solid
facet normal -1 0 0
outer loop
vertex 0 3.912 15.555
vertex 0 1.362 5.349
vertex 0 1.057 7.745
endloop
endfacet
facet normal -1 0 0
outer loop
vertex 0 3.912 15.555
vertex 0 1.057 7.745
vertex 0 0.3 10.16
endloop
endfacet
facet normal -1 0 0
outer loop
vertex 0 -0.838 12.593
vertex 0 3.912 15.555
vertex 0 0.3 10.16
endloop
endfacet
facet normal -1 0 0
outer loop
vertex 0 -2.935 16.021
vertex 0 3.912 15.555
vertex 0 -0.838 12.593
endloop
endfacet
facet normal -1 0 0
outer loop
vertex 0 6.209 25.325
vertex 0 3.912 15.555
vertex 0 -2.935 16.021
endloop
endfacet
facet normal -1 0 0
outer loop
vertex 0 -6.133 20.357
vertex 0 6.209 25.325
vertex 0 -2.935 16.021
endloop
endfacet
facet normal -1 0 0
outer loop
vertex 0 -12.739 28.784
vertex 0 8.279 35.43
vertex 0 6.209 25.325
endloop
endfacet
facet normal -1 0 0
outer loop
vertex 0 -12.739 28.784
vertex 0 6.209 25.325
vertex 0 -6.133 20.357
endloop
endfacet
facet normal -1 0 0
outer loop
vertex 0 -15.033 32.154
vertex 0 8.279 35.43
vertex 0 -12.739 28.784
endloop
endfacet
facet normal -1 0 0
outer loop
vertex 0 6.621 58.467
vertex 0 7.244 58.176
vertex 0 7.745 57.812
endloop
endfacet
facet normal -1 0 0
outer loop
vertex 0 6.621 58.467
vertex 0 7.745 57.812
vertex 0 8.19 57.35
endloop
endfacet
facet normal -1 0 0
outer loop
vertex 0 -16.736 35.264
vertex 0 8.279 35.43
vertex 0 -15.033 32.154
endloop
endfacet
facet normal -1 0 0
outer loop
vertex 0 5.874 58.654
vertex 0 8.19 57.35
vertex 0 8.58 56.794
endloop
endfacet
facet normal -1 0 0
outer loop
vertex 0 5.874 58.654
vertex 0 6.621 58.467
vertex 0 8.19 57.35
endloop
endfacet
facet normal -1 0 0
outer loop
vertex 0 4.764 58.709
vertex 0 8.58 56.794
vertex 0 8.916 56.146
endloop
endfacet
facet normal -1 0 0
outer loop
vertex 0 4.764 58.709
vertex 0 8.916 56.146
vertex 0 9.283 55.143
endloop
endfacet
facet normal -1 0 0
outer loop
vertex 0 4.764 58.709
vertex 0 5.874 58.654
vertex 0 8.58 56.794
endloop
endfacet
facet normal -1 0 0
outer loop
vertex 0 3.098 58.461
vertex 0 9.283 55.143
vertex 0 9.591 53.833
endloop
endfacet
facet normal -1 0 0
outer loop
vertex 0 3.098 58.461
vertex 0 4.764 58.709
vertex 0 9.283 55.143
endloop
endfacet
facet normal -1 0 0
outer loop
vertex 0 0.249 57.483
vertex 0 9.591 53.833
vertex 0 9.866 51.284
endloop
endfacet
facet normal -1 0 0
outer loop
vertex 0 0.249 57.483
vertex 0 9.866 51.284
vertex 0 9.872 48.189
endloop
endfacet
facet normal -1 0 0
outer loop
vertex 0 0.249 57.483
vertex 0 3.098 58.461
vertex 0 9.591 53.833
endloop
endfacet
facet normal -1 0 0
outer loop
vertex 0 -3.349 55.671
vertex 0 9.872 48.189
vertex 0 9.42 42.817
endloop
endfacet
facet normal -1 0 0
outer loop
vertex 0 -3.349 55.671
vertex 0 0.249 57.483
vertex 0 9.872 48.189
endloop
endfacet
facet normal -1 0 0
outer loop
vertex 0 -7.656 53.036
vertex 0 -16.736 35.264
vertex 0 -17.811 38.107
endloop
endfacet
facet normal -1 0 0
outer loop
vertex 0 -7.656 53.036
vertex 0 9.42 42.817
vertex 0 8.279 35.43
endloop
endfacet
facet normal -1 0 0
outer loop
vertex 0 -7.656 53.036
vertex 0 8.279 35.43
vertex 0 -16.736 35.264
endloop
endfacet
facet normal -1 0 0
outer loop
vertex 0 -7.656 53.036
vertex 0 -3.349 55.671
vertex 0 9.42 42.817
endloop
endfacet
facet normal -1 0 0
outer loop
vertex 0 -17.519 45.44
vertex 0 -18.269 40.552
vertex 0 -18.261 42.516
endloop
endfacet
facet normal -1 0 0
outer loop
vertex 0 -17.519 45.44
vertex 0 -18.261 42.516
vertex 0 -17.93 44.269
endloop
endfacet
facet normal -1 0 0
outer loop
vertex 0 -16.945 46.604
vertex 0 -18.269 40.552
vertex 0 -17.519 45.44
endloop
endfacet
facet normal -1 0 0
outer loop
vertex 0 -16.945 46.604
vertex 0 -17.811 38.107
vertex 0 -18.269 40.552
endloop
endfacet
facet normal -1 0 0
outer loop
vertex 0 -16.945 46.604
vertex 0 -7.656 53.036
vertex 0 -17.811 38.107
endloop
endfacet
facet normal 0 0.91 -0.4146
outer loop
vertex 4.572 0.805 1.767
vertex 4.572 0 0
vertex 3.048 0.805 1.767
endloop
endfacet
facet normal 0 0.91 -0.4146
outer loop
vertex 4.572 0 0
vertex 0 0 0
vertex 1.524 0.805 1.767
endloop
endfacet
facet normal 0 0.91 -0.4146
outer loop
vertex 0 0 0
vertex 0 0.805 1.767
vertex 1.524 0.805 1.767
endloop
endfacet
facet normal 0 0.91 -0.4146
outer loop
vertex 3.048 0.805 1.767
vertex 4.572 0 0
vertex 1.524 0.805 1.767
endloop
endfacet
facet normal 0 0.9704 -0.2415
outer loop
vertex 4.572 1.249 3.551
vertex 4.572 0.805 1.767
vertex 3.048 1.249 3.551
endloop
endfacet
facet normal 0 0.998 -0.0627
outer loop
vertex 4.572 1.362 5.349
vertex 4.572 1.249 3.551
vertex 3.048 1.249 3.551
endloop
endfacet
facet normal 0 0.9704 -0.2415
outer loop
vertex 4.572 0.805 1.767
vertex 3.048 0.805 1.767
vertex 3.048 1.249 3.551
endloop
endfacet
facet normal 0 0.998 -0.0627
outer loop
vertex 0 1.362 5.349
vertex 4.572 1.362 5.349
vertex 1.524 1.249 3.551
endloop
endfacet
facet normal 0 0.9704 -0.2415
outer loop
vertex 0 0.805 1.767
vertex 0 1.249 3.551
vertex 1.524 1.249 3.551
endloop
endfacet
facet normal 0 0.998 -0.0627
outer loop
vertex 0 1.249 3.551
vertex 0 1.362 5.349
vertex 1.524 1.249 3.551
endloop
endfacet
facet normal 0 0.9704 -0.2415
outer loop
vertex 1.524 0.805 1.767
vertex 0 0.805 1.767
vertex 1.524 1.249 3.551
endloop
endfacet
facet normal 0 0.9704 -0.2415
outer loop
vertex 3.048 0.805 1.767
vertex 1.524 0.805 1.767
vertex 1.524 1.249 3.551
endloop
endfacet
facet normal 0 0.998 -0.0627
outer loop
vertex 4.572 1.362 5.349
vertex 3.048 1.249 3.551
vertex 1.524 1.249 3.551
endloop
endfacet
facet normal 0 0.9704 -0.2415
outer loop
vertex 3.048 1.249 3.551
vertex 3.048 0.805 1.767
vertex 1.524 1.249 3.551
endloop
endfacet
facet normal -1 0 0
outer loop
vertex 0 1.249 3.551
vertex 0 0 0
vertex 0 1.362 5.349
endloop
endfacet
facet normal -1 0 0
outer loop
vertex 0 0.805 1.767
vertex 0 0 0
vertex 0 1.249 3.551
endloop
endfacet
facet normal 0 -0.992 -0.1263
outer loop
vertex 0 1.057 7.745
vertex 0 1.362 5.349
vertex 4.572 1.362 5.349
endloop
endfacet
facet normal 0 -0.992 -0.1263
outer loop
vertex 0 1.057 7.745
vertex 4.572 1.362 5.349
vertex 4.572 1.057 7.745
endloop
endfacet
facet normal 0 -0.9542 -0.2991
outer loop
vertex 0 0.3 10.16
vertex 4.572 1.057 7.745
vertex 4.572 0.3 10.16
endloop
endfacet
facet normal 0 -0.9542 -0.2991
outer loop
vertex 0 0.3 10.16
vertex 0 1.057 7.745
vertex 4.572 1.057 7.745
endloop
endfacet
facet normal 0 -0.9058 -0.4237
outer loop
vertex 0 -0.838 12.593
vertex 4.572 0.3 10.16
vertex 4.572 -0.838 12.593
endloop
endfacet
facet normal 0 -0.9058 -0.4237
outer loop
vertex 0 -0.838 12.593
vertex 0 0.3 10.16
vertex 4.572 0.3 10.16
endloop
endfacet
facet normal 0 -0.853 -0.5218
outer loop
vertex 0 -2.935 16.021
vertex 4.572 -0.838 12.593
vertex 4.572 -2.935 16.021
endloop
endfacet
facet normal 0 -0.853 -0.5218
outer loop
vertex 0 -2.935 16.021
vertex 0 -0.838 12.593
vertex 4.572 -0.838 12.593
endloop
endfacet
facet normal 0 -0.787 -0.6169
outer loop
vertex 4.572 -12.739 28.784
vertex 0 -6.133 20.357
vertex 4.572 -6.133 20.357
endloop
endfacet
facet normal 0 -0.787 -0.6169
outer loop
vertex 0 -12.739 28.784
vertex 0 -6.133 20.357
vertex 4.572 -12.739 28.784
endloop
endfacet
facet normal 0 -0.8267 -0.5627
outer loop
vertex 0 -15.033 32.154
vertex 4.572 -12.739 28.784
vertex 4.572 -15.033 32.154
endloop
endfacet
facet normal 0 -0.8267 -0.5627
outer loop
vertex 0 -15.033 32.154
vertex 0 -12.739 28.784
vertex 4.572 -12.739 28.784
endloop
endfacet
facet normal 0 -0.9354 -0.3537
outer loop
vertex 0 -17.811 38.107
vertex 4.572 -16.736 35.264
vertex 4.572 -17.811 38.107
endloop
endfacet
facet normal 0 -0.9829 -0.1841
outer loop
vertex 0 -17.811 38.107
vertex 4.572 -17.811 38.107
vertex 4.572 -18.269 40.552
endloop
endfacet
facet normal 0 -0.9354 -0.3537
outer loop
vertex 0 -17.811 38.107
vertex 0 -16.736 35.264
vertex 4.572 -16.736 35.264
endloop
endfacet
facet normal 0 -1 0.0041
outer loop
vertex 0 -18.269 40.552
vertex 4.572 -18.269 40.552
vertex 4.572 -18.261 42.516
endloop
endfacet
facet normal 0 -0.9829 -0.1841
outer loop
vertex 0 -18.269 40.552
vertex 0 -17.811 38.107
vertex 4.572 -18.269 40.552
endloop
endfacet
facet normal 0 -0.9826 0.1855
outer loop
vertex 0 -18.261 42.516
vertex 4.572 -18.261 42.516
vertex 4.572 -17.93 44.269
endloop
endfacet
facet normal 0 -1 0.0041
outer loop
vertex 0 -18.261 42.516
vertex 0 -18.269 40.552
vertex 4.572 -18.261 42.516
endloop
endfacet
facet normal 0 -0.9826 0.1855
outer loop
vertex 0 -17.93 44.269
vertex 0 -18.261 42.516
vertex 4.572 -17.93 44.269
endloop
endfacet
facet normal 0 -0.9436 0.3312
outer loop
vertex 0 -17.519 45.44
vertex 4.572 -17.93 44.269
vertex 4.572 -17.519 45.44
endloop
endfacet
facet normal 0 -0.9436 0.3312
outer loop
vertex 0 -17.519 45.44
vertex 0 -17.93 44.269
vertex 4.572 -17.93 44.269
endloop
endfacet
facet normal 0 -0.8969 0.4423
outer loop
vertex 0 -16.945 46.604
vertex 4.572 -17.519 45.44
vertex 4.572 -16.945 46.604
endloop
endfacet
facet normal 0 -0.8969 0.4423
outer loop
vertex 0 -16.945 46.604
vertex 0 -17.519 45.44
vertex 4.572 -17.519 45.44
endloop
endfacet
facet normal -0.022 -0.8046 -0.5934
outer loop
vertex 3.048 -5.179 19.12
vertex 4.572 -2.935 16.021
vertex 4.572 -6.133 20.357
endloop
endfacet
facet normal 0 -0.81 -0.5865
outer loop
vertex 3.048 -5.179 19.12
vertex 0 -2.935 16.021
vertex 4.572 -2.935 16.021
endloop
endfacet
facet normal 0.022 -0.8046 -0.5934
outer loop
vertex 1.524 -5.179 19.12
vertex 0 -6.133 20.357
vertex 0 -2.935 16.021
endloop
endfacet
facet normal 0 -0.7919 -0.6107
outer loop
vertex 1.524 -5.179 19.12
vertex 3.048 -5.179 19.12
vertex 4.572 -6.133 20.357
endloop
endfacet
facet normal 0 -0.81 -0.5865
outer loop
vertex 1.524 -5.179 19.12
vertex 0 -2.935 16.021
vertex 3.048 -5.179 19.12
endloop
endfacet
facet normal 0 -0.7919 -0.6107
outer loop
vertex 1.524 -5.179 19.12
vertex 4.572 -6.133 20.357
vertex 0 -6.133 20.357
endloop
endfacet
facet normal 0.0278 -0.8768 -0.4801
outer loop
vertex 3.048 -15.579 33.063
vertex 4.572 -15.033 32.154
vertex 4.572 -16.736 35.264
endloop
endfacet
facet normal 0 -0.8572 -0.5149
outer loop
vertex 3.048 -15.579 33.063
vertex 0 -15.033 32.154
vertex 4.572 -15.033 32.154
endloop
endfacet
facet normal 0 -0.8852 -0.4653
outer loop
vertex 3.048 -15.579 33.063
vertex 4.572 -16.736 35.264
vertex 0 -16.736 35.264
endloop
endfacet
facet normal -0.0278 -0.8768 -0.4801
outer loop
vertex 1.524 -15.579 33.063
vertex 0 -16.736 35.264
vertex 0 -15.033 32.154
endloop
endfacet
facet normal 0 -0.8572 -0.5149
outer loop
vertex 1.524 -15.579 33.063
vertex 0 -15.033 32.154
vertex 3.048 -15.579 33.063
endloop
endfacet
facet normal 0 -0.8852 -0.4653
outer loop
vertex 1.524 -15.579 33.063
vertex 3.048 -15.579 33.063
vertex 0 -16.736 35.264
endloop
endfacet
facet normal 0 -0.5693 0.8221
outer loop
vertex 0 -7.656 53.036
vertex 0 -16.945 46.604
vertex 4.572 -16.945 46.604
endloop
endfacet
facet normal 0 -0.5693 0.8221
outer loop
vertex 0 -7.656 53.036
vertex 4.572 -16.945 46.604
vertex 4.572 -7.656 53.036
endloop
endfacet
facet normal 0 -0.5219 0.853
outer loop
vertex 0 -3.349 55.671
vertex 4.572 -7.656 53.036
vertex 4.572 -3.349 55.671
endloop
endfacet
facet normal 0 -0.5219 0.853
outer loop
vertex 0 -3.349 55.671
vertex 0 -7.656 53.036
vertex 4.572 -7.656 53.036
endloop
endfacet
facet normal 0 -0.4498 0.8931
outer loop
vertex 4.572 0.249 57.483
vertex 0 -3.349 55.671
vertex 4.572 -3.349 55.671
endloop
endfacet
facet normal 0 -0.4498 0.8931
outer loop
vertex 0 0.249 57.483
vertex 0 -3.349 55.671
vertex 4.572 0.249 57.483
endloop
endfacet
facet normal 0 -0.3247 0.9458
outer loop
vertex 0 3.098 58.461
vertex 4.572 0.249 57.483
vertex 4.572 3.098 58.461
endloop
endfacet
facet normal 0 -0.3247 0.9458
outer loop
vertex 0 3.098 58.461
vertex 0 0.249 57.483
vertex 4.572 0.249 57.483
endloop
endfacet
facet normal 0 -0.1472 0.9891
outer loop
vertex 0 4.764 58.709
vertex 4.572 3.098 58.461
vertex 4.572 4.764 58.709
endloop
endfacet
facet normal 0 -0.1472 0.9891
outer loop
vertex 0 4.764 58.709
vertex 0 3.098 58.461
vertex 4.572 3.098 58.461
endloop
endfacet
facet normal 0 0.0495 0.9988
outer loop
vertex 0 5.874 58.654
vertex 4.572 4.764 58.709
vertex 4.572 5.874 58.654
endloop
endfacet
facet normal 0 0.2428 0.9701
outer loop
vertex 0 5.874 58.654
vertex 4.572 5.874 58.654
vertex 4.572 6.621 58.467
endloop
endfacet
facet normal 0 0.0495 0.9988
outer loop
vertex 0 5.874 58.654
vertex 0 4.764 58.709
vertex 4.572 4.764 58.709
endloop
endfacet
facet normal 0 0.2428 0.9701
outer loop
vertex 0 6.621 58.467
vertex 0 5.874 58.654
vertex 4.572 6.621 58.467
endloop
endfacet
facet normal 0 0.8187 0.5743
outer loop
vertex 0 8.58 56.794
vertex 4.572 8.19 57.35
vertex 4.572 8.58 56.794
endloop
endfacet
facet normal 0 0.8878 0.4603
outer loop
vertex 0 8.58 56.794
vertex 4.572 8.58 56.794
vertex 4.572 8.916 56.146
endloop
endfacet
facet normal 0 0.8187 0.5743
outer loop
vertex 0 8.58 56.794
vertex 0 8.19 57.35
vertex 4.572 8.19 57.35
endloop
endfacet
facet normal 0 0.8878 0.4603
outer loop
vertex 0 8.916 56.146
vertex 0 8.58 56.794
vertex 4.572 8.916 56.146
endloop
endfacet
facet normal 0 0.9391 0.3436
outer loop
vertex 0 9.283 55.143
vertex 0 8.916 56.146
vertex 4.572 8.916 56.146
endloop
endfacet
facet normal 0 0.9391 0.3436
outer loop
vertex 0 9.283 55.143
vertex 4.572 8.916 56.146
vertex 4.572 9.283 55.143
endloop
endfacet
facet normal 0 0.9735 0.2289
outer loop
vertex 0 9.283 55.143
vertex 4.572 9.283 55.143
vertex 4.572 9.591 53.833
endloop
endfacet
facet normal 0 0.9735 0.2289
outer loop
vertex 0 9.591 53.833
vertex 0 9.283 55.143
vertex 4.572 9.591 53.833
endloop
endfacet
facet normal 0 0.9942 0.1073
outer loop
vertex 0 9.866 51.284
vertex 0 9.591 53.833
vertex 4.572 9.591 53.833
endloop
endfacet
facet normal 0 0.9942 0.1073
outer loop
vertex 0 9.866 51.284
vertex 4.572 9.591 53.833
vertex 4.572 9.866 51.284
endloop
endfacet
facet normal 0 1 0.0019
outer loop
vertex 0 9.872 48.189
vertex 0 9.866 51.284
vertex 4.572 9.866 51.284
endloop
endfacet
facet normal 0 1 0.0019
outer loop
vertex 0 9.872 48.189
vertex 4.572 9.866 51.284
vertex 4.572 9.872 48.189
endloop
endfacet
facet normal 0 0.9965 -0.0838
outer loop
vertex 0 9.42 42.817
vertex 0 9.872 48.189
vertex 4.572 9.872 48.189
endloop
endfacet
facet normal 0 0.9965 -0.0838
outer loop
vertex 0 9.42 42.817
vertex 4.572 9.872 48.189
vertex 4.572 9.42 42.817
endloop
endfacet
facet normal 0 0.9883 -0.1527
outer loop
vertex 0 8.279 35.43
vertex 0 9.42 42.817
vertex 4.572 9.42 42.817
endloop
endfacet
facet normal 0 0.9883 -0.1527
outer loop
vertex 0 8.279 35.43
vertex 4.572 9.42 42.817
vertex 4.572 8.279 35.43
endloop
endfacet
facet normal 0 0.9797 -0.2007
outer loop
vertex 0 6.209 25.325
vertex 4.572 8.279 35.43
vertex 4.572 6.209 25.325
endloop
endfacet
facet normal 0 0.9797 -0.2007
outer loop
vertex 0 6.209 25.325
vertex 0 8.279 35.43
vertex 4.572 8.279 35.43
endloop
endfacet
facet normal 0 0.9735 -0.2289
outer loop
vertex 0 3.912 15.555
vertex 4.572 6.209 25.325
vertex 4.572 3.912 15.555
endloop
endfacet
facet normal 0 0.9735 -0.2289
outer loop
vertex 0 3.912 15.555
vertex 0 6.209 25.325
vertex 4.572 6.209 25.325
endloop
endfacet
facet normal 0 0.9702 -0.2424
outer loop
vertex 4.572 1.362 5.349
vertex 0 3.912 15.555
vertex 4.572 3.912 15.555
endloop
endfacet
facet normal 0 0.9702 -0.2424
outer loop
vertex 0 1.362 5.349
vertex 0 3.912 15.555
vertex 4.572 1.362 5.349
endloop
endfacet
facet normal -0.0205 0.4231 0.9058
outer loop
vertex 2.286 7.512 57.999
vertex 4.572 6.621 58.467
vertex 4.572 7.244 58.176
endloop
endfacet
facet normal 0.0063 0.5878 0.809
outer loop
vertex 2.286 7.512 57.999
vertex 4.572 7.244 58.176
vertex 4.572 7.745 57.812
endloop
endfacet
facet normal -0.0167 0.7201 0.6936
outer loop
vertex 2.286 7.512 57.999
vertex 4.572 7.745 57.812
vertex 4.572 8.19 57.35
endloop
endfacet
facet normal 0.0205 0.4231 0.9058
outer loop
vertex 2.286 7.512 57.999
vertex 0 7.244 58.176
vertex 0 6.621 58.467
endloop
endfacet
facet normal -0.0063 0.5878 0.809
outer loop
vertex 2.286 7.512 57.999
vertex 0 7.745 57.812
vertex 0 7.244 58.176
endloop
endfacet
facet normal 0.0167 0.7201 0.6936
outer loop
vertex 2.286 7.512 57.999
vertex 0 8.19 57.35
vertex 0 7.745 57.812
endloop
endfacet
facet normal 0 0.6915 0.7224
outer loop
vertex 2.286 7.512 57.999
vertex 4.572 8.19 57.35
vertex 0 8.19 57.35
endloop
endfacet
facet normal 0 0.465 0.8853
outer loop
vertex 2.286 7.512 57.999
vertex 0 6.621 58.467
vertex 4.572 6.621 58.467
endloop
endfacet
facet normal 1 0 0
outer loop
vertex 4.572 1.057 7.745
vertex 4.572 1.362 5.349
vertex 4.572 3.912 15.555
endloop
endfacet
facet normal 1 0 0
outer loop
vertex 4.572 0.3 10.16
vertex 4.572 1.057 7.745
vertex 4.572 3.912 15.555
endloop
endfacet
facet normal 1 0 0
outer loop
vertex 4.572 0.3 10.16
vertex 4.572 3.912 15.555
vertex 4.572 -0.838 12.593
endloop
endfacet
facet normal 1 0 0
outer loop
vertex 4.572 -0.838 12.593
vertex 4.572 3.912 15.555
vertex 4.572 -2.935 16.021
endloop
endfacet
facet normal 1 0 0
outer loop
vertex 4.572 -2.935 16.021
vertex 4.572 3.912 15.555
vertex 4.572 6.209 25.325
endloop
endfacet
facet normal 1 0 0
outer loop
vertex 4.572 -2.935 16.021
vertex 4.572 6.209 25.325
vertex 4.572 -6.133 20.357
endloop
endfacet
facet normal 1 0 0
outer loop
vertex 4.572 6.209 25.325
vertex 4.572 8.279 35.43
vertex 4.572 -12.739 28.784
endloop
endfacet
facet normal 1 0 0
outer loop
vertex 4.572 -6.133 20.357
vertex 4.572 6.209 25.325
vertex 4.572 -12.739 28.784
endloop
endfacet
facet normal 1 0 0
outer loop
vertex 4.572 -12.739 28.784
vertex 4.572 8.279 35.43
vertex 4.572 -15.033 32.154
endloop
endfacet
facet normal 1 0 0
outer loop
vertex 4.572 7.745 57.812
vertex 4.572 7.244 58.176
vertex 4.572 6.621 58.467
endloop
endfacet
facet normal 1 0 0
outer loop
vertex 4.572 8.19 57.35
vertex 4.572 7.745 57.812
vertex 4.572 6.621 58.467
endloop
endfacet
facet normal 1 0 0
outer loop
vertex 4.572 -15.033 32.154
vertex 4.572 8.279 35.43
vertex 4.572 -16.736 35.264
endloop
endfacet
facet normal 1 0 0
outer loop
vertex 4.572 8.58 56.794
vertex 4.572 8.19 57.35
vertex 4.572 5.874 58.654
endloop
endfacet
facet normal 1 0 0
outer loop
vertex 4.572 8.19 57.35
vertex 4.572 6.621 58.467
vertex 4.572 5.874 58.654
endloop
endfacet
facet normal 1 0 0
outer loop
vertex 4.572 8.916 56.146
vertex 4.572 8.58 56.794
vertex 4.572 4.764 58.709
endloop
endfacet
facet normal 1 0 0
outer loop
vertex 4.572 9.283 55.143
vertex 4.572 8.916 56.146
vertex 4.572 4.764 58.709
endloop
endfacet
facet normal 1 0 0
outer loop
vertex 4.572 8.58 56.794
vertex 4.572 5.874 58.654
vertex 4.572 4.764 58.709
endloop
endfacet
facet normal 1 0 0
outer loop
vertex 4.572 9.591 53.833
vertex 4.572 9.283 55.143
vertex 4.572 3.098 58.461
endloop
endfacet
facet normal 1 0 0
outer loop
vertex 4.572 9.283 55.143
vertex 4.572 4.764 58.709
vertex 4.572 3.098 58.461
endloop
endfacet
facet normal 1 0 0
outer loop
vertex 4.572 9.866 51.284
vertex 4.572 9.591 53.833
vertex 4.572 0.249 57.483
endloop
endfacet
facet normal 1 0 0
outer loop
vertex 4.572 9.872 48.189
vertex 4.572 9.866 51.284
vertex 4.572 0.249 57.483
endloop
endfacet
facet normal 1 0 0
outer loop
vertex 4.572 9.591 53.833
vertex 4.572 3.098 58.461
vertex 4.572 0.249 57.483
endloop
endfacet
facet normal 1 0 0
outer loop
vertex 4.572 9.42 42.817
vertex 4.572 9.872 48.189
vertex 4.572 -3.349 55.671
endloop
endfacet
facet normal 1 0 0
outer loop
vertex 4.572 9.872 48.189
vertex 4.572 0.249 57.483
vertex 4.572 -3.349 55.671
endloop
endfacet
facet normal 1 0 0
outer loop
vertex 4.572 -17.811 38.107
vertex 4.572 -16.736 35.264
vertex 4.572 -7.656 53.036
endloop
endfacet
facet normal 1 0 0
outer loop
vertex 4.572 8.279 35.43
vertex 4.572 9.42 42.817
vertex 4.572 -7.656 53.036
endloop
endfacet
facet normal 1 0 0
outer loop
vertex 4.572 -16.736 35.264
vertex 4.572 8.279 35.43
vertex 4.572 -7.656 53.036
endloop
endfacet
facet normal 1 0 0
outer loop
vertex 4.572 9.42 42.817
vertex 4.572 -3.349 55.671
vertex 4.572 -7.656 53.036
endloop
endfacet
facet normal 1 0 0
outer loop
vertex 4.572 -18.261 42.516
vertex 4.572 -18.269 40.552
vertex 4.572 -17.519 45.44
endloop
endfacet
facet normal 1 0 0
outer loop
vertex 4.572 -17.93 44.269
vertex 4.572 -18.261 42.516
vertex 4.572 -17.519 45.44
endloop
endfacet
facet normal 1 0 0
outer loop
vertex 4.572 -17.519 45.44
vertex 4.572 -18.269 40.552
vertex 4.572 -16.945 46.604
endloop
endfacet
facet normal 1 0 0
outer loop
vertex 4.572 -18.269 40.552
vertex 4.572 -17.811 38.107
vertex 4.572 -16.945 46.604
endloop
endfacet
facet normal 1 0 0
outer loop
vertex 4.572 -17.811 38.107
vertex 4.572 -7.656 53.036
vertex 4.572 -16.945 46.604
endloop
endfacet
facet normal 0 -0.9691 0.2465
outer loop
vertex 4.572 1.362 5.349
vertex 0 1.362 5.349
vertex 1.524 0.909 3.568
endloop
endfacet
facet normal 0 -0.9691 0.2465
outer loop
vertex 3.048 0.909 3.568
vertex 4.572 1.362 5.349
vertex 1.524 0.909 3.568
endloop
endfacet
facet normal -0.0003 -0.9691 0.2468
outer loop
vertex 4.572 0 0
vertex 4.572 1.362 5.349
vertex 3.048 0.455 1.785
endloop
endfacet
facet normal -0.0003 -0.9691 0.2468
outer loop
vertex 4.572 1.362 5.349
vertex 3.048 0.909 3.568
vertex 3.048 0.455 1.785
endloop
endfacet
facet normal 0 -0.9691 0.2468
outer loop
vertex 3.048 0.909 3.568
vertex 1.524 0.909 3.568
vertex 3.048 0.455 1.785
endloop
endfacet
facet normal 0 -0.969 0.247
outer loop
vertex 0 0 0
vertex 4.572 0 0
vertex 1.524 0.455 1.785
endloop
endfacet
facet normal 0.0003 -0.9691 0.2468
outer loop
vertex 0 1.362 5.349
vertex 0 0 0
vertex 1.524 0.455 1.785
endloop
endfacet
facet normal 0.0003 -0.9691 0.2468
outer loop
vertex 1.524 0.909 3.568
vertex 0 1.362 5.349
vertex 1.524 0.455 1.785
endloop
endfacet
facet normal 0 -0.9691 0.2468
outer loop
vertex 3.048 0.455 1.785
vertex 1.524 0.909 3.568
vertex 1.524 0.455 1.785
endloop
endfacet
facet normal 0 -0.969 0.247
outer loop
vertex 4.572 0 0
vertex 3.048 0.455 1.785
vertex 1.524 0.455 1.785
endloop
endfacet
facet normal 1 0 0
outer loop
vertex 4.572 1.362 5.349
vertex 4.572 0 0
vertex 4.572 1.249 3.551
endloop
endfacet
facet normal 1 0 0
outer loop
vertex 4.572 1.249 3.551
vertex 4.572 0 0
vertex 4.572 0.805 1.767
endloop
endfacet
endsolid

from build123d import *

# Parameters (mm, degrees)
F1_DEPTH = 4.572


with BuildPart() as f1:
    # F0 (on Right) → F1 (new body)
    with BuildSketch(Plane.YZ):
        with BuildLine():
            add(Edge.make_bspline(
                [(1.3620024716, 5.3489339752), (0.910567978, 3.570365461), (0.455283989, 1.7851827305), (0, 0)],
                knots=[0.9602645799, 0.9602645799, 0.9602645799, 0.9602645799, 1, 1, 1, 1], degree=3))
            add(Edge.make_bspline(
                [(0, 0), (0.996218244, 1.7588407678), (1.4039287781, 3.5438794073), (1.3620024716, 5.3489339752)],
                knots=[0, 0, 0, 0, 5.8507649402, 5.8507649402, 5.8507649402, 5.8507649402], degree=3))
        make_face()
    extrude(amount=F1_DEPTH)


with BuildPart() as f1b:
    # F0 (on Right) → F1, piece 2 (new body)
    with BuildSketch(Plane.YZ):
        with BuildLine():
            add(Edge.make_bspline(
                [(1.3620024716, 5.3489339752), (1.0485777282, 18.8428191444), (-24.3926915703, 33.4552895685), (-16.9453518465, 46.6036983607)],
                knots=[5.8507649402, 5.8507649402, 5.8507649402, 5.8507649402, 49.5888056934, 49.5888056934, 49.5888056934, 49.5888056934], degree=3))
            add(Edge.make_bspline(
                [(-16.9453518465, 46.6036983607), (-6.800198517, 53.8259219332), (17.2845618837, 70.9715991502), (7.676169153, 30.2255843232), (1.3620024716, 5.3489339752)],
                knots=[0, 0, 0, 0, 0.4044894463, 0.9602645799, 0.9602645799, 0.9602645799, 0.9602645799], degree=3))
        make_face()
    extrude(amount=F1_DEPTH)


solid = Compound([f1.part, f1b.part])
